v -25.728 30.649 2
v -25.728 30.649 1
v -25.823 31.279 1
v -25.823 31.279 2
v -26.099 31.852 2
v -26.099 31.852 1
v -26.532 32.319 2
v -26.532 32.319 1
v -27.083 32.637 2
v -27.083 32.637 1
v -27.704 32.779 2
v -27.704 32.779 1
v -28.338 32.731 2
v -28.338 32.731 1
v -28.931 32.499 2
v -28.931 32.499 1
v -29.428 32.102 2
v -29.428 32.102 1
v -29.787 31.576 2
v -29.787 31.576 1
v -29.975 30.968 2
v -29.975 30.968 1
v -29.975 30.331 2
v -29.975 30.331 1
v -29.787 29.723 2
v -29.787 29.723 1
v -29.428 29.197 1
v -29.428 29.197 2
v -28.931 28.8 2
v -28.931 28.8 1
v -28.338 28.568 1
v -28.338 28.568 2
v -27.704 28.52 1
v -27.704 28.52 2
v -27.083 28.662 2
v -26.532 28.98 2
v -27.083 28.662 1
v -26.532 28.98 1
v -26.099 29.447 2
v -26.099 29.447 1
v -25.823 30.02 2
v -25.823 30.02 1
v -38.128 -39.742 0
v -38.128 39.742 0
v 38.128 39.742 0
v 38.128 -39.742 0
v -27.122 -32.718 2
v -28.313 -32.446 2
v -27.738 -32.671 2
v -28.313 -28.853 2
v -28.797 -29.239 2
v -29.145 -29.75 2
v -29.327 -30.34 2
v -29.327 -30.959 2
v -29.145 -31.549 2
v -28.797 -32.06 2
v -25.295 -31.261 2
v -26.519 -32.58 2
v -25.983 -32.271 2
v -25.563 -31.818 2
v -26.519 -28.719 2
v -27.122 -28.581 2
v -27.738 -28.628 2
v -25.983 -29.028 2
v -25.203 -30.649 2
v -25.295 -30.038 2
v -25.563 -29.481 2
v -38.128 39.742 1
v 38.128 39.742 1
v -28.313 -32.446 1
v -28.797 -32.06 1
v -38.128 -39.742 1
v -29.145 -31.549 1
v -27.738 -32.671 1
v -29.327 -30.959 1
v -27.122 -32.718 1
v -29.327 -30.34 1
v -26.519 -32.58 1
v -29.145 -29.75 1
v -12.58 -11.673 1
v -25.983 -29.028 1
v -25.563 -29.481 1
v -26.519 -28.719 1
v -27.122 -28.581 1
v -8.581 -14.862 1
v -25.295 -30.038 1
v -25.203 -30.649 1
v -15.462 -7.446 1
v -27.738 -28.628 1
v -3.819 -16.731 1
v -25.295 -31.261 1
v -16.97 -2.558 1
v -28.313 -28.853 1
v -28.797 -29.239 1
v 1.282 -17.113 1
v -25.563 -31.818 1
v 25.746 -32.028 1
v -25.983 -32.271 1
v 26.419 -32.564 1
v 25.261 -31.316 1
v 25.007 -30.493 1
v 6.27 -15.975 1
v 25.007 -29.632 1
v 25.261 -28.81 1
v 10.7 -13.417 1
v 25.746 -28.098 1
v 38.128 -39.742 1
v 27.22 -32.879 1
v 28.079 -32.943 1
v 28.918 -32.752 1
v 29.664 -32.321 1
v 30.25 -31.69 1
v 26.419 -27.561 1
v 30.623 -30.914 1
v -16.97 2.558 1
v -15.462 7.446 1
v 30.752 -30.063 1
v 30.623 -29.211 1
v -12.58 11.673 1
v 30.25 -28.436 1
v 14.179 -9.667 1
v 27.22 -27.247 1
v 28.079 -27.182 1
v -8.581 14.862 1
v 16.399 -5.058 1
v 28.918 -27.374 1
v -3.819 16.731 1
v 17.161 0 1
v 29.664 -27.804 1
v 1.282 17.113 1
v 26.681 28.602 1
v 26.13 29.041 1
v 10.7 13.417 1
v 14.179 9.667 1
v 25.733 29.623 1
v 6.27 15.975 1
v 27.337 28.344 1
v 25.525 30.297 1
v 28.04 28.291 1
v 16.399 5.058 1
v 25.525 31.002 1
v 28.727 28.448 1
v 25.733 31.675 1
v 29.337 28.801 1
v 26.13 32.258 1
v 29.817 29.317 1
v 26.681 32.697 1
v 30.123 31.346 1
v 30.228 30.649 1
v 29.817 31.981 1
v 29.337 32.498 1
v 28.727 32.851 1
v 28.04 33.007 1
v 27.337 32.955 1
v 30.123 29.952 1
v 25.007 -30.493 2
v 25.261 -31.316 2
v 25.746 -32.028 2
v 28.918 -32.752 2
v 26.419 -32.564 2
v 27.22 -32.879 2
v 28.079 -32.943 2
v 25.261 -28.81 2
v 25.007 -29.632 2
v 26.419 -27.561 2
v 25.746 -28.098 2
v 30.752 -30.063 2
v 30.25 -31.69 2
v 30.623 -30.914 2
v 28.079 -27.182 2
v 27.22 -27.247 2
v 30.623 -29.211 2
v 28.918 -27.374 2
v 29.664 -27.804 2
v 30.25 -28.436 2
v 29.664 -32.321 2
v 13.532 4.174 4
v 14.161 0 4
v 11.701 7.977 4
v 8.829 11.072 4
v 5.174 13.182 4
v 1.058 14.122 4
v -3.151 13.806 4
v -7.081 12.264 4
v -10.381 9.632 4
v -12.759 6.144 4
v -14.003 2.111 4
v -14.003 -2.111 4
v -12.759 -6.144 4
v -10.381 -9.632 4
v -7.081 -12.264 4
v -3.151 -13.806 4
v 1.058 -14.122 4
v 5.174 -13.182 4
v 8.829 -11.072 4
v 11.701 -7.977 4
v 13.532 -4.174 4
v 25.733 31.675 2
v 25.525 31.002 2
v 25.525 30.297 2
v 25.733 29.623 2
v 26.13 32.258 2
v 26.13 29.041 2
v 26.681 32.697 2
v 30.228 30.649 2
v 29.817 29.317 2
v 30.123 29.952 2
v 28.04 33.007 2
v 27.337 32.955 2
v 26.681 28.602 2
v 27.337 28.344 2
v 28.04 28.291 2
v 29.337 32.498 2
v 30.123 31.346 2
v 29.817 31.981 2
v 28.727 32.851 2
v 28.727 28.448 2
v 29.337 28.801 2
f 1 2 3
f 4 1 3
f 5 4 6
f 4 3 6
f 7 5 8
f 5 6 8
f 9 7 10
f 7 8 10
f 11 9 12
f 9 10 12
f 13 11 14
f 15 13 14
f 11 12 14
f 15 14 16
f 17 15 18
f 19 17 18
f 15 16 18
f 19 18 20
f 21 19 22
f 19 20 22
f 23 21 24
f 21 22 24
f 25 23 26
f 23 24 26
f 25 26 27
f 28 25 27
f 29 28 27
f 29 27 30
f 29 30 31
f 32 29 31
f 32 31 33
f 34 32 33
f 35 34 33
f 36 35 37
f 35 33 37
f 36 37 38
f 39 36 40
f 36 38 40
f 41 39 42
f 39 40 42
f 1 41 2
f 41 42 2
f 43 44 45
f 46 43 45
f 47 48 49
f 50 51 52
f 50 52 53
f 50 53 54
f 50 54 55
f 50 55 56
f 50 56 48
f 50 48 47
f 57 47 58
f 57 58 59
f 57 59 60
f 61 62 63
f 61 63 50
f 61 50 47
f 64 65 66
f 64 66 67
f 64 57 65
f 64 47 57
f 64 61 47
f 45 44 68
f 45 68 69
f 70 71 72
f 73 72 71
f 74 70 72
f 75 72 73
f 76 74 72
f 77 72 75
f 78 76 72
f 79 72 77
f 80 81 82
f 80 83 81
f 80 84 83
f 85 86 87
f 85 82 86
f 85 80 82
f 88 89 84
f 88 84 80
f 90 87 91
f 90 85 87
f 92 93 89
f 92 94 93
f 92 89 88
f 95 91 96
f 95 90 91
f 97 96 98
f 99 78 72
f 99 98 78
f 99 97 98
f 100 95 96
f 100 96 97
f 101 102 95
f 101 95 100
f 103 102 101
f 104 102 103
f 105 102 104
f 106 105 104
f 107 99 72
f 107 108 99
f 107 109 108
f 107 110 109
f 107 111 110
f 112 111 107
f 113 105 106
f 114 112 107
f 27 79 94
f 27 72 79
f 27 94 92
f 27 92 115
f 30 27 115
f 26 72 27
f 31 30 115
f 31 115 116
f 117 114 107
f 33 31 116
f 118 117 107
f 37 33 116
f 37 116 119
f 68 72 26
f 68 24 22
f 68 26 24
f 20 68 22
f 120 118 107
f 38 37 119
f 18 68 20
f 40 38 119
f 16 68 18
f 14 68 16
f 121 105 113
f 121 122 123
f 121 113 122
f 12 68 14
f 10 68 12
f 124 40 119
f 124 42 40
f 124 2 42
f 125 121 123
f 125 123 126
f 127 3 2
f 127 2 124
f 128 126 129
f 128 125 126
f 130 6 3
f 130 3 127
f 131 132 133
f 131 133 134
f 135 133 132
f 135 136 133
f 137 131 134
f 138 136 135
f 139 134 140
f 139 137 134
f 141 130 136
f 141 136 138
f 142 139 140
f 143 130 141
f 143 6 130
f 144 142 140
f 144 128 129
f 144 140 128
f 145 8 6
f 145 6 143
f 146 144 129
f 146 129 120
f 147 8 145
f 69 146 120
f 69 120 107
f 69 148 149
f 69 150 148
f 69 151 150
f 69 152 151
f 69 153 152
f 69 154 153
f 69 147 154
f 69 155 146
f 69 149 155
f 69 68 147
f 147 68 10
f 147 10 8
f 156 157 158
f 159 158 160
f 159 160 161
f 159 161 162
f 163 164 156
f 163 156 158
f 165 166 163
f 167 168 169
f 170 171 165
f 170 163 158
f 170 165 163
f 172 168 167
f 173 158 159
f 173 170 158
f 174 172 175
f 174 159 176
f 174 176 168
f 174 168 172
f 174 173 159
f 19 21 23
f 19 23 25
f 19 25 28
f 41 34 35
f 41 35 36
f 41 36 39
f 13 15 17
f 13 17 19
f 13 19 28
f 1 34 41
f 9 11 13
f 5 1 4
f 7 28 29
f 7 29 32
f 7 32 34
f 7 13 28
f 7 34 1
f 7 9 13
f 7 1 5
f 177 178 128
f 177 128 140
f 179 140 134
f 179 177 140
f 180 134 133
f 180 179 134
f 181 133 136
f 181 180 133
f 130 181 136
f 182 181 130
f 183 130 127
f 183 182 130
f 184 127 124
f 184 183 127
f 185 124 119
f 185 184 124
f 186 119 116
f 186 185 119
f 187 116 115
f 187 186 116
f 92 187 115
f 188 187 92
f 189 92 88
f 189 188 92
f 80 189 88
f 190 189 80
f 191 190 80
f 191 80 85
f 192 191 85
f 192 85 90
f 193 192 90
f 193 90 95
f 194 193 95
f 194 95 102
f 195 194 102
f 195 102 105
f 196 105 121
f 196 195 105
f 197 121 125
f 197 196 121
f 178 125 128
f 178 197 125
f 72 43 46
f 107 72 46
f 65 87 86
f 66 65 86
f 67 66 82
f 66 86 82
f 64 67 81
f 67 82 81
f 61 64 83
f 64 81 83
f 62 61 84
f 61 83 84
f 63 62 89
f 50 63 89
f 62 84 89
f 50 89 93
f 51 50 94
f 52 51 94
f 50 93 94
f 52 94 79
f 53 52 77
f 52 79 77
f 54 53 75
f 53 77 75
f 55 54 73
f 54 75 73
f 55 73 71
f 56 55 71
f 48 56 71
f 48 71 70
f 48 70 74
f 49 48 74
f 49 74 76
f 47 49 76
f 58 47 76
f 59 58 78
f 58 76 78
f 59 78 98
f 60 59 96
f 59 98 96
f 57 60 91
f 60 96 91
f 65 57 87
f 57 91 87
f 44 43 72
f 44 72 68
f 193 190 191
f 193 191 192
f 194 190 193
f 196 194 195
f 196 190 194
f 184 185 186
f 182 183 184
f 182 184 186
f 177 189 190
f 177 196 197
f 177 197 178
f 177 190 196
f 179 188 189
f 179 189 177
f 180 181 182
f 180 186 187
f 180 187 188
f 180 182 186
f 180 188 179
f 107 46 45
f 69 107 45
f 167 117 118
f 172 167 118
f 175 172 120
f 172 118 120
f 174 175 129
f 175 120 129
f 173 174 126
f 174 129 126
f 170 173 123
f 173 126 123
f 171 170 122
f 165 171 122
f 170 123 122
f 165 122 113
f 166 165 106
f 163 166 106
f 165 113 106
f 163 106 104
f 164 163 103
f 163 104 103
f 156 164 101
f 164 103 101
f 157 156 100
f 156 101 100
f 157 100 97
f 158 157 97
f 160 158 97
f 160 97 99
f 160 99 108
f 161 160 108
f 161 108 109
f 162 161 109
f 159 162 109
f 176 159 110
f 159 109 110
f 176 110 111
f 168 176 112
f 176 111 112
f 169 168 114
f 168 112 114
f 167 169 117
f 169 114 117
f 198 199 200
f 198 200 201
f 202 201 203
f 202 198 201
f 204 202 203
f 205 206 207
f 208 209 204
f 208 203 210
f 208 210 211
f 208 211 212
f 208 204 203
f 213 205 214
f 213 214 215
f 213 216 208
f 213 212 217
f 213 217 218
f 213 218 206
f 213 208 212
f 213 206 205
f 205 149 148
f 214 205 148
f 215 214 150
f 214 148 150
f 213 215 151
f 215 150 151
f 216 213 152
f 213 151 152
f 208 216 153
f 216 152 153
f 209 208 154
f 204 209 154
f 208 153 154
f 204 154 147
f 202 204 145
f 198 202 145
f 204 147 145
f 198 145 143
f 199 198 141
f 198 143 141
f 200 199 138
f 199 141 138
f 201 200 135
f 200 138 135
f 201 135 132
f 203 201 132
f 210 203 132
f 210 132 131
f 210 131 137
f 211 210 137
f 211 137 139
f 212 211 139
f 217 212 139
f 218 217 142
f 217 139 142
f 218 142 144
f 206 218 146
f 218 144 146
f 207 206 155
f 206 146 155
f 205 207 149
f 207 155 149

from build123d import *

# Parameters (mm, degrees)
F1_R     = 24.1613499239
F2_DEPTH = 4
F0_W     = 76.2569829822
F0_H     = 79.4832408428
F3_DEPTH = 1
F4_R     = 2.0739165502
F5_DEPTH = 1
F6_R     = 2.8886313869
F6_R_2   = 2.3646284302
F6_R_3   = 2.1352299697
F7_DEPTH = 1


# Not quite as in the source:
# - a fillet or chamfer that OpenCascade refuses, or shapes differently, is made with other operations: its cross-section is extruded or revolved along the edge and cut away or added


with BuildPart() as f2:
    # F1 (on face) → F2 (new body)
    with BuildSketch(Plane.XY):
        Circle(F1_R)
    extrude(amount=F2_DEPTH)

    # F0 (on Top) → F3 (join)
    with BuildSketch(Plane.XY):
        Rectangle(F0_W, F0_H)
    extrude(amount=F3_DEPTH)

    # F4 (on face) → F5 (join)
    with BuildSketch(Plane.XY.offset(1)):
        with Locations((-27.2765364498, -30.6494422257)):
            Circle(F4_R)
    extrude(amount=F5_DEPTH)

    # F6 (on face) → F7 (join)
    with BuildSketch(Plane.XY.offset(1)):
        with Locations((27.8631281108, -30.0628505647)):
            Circle(F6_R)
        with Locations((27.8631281108, 30.6494422257)):
            Circle(F6_R_2)
        with Locations((-27.8631299734, 30.6494422257)):
            Circle(F6_R_3)
    extrude(amount=F7_DEPTH)

    # F8: chamfer of 10 on 1 edges, made by hand


with BuildPart() as f8_tool2:
    # F8_s3 → F8_t4 (revolve)
    with BuildSketch(Plane.XZ):
        with BuildLine():
            Line((24.4441926363, -6.2828427125), (13.8785072114, 4.2828427125))
            Line((13.8785072114, 4.2828427125), (13.8785072114, 4.4828427125))
            ThreePointArc((13.8785072114, 4.4828427125), (19.0199285676, 4.2), (24.1613499239, 4.2))
            Line((24.1613499239, 4.2), (24.3613499239, 4))
            ThreePointArc((24.3613499239, 4), (24.3613499239, -1.1414213562), (24.6441926363, -6.2828427125))
            Line((24.6441926363, -6.2828427125), (24.4441926363, -6.2828427125))
        make_face()
    revolve(axis=Axis((0, 0, 4), (0, 0, 1)))

    split(bisect_by=Plane.XY.offset(1), keep=Keep.TOP)


with BuildPart() as f2_1:
    add(f2.part)

    # F8_t1: cut F8_tool2
    add(f8_tool2.part, mode=Mode.SUBTRACT)


solid = f2_1.part
